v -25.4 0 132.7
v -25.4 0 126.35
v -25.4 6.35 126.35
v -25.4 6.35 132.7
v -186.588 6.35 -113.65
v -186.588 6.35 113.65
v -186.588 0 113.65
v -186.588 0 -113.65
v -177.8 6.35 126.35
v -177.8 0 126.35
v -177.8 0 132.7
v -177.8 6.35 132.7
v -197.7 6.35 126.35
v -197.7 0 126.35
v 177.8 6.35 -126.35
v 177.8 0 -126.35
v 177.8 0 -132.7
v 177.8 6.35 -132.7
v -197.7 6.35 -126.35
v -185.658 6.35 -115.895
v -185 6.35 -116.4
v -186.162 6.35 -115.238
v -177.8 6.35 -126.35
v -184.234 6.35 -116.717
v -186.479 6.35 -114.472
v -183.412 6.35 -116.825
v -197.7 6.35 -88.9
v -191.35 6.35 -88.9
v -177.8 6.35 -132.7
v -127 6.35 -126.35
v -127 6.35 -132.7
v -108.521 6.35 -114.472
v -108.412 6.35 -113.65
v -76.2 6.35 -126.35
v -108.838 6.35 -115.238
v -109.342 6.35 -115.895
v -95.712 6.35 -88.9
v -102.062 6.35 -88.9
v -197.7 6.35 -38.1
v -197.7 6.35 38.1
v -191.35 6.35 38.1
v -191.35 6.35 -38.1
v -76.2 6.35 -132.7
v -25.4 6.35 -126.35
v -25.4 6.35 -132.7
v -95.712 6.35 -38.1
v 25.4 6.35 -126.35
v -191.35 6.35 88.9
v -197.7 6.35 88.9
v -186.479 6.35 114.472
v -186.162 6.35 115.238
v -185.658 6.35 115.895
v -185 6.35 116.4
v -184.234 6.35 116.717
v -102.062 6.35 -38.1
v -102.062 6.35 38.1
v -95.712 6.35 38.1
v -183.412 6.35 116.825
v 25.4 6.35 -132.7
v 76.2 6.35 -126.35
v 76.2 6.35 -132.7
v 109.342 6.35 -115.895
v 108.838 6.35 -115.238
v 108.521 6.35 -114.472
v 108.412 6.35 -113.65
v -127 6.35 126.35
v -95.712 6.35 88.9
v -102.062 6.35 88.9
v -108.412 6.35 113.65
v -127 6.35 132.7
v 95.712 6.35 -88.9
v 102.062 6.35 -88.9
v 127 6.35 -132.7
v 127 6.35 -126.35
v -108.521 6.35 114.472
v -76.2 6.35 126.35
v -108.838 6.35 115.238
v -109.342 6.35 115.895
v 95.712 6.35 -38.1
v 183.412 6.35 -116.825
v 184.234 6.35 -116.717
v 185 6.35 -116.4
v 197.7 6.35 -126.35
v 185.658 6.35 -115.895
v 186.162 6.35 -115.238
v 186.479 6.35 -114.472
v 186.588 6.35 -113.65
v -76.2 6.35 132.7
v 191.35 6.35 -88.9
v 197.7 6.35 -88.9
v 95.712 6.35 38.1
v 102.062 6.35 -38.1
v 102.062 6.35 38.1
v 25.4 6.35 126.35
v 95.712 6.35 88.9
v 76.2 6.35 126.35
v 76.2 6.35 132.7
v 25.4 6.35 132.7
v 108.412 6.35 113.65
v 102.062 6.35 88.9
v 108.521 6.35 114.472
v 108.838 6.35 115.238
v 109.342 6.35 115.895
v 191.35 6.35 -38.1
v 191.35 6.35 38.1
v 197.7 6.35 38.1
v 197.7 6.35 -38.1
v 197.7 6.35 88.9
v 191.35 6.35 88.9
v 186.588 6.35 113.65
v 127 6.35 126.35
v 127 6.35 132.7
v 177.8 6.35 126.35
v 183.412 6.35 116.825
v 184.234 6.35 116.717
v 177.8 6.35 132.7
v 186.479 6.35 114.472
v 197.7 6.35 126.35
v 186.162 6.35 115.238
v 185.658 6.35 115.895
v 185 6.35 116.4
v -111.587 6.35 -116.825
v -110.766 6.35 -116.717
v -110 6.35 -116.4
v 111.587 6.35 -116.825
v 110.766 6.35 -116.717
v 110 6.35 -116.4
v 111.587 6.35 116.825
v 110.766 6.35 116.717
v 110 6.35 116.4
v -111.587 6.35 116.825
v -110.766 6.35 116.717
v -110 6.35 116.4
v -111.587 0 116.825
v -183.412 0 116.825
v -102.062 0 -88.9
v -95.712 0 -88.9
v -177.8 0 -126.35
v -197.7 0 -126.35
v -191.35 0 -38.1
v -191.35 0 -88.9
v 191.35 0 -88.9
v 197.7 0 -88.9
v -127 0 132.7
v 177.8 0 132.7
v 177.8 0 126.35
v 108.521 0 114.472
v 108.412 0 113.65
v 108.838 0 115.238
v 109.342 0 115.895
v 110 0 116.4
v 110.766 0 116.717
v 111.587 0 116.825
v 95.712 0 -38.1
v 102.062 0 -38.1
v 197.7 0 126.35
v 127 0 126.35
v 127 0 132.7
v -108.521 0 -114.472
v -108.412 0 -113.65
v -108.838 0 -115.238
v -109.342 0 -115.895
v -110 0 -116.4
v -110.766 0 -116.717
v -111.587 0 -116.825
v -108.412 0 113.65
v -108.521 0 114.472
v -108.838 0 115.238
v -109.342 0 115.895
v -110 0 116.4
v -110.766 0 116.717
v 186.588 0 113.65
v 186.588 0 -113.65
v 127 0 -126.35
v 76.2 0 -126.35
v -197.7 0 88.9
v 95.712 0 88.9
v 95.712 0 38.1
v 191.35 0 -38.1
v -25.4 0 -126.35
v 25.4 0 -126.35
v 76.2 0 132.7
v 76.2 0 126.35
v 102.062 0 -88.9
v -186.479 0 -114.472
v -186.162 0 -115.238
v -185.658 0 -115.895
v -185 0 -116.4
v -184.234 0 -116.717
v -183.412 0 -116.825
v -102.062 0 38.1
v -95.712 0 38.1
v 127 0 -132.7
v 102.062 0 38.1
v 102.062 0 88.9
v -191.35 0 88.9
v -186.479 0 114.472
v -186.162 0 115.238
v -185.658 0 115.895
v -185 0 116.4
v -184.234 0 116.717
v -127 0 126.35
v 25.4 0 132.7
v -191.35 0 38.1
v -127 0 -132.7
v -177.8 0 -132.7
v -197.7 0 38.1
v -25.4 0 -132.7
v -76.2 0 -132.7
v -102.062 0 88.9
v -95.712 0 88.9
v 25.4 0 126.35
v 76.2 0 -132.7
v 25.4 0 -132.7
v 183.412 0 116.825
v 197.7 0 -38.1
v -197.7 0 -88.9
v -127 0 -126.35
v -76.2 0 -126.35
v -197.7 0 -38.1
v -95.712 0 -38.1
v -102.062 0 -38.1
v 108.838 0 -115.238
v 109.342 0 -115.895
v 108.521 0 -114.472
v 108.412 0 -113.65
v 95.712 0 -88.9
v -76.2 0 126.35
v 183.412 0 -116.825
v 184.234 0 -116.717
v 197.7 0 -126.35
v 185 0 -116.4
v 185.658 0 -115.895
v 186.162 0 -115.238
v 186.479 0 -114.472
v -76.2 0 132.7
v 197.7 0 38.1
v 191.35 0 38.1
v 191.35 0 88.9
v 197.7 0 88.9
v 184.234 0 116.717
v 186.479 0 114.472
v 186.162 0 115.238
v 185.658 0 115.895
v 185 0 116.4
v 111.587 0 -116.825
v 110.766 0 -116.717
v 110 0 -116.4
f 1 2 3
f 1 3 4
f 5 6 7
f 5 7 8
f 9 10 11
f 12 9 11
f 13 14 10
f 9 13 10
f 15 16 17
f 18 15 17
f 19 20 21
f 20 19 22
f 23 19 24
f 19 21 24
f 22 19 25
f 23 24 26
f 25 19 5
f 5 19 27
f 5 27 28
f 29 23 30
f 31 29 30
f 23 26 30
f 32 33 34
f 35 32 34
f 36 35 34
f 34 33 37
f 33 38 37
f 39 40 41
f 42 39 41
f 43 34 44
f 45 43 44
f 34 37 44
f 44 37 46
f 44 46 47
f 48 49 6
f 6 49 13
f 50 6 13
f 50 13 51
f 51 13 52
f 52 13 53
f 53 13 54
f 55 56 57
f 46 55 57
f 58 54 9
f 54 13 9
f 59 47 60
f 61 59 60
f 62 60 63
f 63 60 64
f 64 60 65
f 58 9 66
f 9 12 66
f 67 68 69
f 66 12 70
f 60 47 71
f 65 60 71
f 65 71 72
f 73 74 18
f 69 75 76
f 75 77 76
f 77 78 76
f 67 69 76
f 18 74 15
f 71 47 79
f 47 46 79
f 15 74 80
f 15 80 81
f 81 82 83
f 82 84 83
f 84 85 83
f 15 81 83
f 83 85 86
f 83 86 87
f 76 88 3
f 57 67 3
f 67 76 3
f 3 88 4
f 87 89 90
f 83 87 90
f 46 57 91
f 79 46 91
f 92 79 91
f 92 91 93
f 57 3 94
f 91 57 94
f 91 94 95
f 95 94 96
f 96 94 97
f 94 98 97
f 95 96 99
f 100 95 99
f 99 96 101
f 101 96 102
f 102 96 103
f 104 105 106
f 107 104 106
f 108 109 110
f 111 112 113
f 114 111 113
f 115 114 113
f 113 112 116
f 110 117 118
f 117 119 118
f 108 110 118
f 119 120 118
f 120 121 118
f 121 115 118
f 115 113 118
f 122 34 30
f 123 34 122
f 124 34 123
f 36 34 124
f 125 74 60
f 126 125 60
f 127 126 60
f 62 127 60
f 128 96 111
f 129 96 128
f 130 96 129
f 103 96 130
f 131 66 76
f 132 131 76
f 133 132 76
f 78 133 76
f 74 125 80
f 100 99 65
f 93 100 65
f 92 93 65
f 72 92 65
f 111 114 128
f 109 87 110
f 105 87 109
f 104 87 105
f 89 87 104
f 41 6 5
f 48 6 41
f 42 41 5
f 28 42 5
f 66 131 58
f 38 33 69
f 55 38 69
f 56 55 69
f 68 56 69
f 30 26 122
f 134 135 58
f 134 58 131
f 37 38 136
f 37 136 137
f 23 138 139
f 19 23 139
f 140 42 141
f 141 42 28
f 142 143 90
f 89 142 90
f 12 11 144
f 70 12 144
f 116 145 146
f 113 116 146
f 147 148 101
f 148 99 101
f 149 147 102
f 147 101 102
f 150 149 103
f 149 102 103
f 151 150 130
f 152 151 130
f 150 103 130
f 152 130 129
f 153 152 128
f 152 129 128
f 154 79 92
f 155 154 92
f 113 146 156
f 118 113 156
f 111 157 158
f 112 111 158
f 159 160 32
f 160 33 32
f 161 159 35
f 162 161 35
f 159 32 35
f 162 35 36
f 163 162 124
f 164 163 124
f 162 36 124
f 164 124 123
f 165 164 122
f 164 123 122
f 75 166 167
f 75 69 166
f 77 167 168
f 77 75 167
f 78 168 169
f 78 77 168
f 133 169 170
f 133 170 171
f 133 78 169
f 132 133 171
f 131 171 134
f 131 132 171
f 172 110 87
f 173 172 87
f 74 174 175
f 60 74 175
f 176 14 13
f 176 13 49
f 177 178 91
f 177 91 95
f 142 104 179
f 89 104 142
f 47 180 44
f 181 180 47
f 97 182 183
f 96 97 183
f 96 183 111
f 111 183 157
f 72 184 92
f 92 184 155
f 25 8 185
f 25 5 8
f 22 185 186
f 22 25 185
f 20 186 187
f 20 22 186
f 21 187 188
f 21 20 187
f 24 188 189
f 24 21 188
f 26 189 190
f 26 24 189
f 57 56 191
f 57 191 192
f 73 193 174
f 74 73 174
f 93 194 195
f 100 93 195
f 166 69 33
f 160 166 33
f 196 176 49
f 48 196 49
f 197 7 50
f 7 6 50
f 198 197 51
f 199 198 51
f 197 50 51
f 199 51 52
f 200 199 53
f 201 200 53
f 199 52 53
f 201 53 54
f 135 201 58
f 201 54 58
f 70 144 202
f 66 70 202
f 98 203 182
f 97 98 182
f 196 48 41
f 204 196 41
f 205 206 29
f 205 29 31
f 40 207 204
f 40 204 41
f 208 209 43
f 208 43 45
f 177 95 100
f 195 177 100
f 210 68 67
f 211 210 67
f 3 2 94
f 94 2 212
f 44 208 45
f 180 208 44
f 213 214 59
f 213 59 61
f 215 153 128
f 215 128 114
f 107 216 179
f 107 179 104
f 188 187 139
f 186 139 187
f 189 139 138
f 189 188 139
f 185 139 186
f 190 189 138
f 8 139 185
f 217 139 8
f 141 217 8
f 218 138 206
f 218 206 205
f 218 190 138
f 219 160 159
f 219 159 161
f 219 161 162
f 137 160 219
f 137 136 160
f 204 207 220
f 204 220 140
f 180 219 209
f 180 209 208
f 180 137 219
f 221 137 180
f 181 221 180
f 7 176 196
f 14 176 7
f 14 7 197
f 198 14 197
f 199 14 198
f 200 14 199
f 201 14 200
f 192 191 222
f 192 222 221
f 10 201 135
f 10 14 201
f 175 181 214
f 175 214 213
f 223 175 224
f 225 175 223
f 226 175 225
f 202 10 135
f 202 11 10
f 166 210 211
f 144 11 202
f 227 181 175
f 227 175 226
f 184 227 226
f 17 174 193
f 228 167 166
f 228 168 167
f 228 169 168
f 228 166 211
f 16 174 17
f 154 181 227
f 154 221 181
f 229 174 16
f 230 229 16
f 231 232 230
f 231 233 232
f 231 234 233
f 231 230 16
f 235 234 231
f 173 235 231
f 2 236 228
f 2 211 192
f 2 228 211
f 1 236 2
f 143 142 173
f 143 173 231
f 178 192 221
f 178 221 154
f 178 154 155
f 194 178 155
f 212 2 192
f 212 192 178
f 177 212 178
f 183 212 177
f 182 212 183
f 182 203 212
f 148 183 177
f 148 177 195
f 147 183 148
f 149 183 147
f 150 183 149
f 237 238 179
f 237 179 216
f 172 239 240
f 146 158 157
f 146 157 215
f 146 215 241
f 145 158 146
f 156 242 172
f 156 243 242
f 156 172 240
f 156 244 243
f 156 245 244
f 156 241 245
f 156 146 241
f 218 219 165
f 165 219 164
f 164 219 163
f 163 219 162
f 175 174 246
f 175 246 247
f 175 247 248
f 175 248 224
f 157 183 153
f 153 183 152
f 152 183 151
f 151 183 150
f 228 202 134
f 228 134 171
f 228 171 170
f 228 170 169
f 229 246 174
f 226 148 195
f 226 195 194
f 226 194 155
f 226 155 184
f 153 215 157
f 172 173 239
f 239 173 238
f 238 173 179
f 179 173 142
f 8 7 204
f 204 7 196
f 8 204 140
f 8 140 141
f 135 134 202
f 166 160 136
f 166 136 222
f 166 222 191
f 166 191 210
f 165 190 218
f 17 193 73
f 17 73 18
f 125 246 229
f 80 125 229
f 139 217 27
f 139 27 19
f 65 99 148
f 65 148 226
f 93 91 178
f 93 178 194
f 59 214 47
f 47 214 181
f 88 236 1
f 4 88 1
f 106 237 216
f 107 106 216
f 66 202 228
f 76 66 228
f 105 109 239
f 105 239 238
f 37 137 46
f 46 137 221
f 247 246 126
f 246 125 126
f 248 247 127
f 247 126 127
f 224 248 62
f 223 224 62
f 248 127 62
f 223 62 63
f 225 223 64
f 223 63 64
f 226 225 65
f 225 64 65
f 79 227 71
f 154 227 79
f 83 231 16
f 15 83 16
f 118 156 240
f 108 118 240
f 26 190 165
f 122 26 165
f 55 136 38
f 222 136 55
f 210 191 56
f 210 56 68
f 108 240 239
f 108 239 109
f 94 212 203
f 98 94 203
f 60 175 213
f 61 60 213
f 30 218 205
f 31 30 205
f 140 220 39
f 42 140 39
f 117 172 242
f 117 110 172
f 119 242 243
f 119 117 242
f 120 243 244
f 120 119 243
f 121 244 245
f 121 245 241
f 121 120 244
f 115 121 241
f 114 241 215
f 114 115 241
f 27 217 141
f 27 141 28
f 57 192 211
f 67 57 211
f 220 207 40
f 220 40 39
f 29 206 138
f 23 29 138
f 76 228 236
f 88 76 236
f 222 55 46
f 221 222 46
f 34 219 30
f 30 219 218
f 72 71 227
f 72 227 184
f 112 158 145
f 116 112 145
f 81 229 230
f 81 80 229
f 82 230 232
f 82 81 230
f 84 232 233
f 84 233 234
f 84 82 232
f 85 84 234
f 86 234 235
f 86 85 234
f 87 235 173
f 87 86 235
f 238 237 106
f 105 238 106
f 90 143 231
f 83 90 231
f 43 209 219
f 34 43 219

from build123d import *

# Parameters (mm, degrees)
SKETCH5_W           = 395.4
SKETCH5_H           = 265.4
BOSS_EXTRUDE3_DEPTH = 6.35
SKETCH6_W           = 78.175
SKETCH6_H           = 243.175
SKETCH6_W_2         = 75
SKETCH6_H_2         = 240
CUT_EXTRUDE1_DEPTH  = 6.35
SKETCH10_W          = 6.35
SKETCH10_H          = 50.8
SKETCH10_W_2        = 50.8
SKETCH10_H_2        = 6.35
CUT_EXTRUDE2_DEPTH  = 6.35
SKETCH11_W          = 50.8
SKETCH11_H          = 6.35
CUT_EXTRUDE3_DEPTH  = 6.35
SKETCH12_W          = 78.175
SKETCH12_H          = 4.7625
BOSS_EXTRUDE4_DEPTH = 6.35
FILLET1_R           = 3.175


with BuildPart() as part:
    # Sketch5 → Boss-Extrude3 (new body)
    with BuildSketch(Plane(origin=(0, 0, 0), x_dir=(1, 0, 0), z_dir=(0, 1, 0))):
        Rectangle(SKETCH5_W, SKETCH5_H)
    extrude(amount=BOSS_EXTRUDE3_DEPTH)

    # Sketch6 → Cut-Extrude1 (cut)
    # profile 1 of 4: a face of its own
    with BuildSketch(Plane(origin=(0, 6.35, 0), x_dir=(1, 0, 0), z_dir=(0, 1, 0))):
        with Locations((147.5, 0)):
            Rectangle(SKETCH6_W, SKETCH6_H)
        with Locations((147.5, 0)):
            Rectangle(SKETCH6_W_2, SKETCH6_H_2, mode=Mode.SUBTRACT)
    # profile 2 of 4: a face of its own
    with BuildSketch(Plane(origin=(0, 6.35, 0), x_dir=(1, 0, 0), z_dir=(0, 1, 0))):
        with Locations((147.5, 0)):
            Rectangle(SKETCH6_W_2, SKETCH6_H_2)
    # profile 3 of 4: a face of its own
    with BuildSketch(Plane(origin=(0, 6.35, 0), x_dir=(1, 0, 0), z_dir=(0, 1, 0))):
        with Locations((-147.5, 0)):
            Rectangle(SKETCH6_W, SKETCH6_H)
        with Locations((-147.5, 0)):
            Rectangle(SKETCH6_W_2, SKETCH6_H_2, mode=Mode.SUBTRACT)
    # profile 4 of 4: a face of its own
    with BuildSketch(Plane(origin=(0, 6.35, 0), x_dir=(1, 0, 0), z_dir=(0, 1, 0))):
        with Locations((-147.5, 0)):
            Rectangle(SKETCH6_W_2, SKETCH6_H_2)
    extrude(amount=-CUT_EXTRUDE1_DEPTH, mode=Mode.SUBTRACT)

    # Sketch10 → Cut-Extrude2 (cut)
    with BuildSketch(Plane.XZ):
        with Locations((98.8875, -63.5)):
            Rectangle(SKETCH10_W, SKETCH10_H)
        with Locations((98.8875, 63.5)):
            Rectangle(SKETCH10_W, SKETCH10_H)
        with Locations((-98.8875, 63.5)):
            Rectangle(SKETCH10_W, SKETCH10_H)
        with Locations((-98.8875, -63.5)):
            Rectangle(SKETCH10_W, SKETCH10_H)
        Polygon((197.7, 132.7), (177.8, 132.7), (177.8, 126.35), (191.35, 126.35), (197.7, 126.35), align=None)
        Polygon((127, 132.7), (76.2, 132.7), (76.2, 126.35), (95.7125, 126.35), (102.0625, 126.35), (108.4125, 126.35), (127, 126.35), align=None)
        with Locations((0, 129.525)):
            Rectangle(SKETCH10_W_2, SKETCH10_H_2)
        Polygon((-127, 132.7), (-127, 126.35), (-108.4125, 126.35), (-102.0625, 126.35), (-95.7125, 126.35), (-76.2, 126.35), (-76.2, 132.7), align=None)
        Polygon((-197.7, 126.35), (-191.35, 126.35), (-177.8, 126.35), (-177.8, 132.7), (-197.7, 132.7), align=None)
        Polygon((-177.8, -126.35), (-191.35, -126.35), (-197.7, -126.35), (-197.7, -132.7), (-177.8, -132.7), align=None)
        Polygon((-108.4125, -126.35), (-127, -126.35), (-127, -132.7), (-76.2, -132.7), (-76.2, -126.35), (-95.7125, -126.35), (-102.0625, -126.35), align=None)
        with Locations((0, -129.525)):
            Rectangle(SKETCH10_W_2, SKETCH10_H_2)
        Polygon((76.2, -126.35), (76.2, -132.7), (127, -132.7), (127, -126.35), (108.4125, -126.35), (102.0625, -126.35), (95.7125, -126.35), align=None)
        Polygon((177.8, -126.35), (177.8, -132.7), (197.7, -132.7), (197.7, -126.35), (191.35, -126.35), align=None)
    extrude(amount=-CUT_EXTRUDE2_DEPTH, mode=Mode.SUBTRACT)

    # Sketch11 → Cut-Extrude3 (cut)
    with BuildSketch(Plane(origin=(197.7, 0, 0), x_dir=(0, 0, -1), z_dir=(1, 0, 0))):
        with Locations((-63.5, 3.175)):
            Rectangle(SKETCH11_W, SKETCH11_H)
        with Locations((63.5, 3.175)):
            Rectangle(SKETCH11_W, SKETCH11_H)
    cut_extrude3 = extrude(amount=-CUT_EXTRUDE3_DEPTH, mode=Mode.SUBTRACT)

    # Mirror1: Cut-Extrude3 across plane
    add(cut_extrude3.mirror(Plane(origin=(0, 0, 0), x_dir=(0, 0, 1), z_dir=(1, 0, 0))), mode=Mode.SUBTRACT)

    # Sketch12 → Boss-Extrude4 (add)
    with BuildSketch(Plane.XZ):
        with Locations((147.5, -119.20625)):
            Rectangle(SKETCH12_W, SKETCH12_H)
        with Locations((147.5, 119.20625)):
            Rectangle(SKETCH12_W, SKETCH12_H)
        with Locations((-147.5, 119.20625)):
            Rectangle(SKETCH12_W, SKETCH12_H)
        with Locations((-147.5, -119.20625)):
            Rectangle(SKETCH12_W, SKETCH12_H)
    extrude(amount=-BOSS_EXTRUDE4_DEPTH)

    # Fillet1
    fillet1_edges = [part.edges().sort_by_distance(p)[0] for p in [
        (108.4125, 3.175, -116.825),
        (186.5875, 3.175, -116.825),
        (186.5875, 3.175, 116.825),
        (108.4125, 3.175, 116.825),
        (-186.5875, 3.175, 116.825),
        (-108.4125, 3.175, 116.825),
        (-108.4125, 3.175, -116.825),
        (-186.5875, 3.175, -116.825),
    ]]
    fillet(fillet1_edges, radius=FILLET1_R)


solid = part.part
